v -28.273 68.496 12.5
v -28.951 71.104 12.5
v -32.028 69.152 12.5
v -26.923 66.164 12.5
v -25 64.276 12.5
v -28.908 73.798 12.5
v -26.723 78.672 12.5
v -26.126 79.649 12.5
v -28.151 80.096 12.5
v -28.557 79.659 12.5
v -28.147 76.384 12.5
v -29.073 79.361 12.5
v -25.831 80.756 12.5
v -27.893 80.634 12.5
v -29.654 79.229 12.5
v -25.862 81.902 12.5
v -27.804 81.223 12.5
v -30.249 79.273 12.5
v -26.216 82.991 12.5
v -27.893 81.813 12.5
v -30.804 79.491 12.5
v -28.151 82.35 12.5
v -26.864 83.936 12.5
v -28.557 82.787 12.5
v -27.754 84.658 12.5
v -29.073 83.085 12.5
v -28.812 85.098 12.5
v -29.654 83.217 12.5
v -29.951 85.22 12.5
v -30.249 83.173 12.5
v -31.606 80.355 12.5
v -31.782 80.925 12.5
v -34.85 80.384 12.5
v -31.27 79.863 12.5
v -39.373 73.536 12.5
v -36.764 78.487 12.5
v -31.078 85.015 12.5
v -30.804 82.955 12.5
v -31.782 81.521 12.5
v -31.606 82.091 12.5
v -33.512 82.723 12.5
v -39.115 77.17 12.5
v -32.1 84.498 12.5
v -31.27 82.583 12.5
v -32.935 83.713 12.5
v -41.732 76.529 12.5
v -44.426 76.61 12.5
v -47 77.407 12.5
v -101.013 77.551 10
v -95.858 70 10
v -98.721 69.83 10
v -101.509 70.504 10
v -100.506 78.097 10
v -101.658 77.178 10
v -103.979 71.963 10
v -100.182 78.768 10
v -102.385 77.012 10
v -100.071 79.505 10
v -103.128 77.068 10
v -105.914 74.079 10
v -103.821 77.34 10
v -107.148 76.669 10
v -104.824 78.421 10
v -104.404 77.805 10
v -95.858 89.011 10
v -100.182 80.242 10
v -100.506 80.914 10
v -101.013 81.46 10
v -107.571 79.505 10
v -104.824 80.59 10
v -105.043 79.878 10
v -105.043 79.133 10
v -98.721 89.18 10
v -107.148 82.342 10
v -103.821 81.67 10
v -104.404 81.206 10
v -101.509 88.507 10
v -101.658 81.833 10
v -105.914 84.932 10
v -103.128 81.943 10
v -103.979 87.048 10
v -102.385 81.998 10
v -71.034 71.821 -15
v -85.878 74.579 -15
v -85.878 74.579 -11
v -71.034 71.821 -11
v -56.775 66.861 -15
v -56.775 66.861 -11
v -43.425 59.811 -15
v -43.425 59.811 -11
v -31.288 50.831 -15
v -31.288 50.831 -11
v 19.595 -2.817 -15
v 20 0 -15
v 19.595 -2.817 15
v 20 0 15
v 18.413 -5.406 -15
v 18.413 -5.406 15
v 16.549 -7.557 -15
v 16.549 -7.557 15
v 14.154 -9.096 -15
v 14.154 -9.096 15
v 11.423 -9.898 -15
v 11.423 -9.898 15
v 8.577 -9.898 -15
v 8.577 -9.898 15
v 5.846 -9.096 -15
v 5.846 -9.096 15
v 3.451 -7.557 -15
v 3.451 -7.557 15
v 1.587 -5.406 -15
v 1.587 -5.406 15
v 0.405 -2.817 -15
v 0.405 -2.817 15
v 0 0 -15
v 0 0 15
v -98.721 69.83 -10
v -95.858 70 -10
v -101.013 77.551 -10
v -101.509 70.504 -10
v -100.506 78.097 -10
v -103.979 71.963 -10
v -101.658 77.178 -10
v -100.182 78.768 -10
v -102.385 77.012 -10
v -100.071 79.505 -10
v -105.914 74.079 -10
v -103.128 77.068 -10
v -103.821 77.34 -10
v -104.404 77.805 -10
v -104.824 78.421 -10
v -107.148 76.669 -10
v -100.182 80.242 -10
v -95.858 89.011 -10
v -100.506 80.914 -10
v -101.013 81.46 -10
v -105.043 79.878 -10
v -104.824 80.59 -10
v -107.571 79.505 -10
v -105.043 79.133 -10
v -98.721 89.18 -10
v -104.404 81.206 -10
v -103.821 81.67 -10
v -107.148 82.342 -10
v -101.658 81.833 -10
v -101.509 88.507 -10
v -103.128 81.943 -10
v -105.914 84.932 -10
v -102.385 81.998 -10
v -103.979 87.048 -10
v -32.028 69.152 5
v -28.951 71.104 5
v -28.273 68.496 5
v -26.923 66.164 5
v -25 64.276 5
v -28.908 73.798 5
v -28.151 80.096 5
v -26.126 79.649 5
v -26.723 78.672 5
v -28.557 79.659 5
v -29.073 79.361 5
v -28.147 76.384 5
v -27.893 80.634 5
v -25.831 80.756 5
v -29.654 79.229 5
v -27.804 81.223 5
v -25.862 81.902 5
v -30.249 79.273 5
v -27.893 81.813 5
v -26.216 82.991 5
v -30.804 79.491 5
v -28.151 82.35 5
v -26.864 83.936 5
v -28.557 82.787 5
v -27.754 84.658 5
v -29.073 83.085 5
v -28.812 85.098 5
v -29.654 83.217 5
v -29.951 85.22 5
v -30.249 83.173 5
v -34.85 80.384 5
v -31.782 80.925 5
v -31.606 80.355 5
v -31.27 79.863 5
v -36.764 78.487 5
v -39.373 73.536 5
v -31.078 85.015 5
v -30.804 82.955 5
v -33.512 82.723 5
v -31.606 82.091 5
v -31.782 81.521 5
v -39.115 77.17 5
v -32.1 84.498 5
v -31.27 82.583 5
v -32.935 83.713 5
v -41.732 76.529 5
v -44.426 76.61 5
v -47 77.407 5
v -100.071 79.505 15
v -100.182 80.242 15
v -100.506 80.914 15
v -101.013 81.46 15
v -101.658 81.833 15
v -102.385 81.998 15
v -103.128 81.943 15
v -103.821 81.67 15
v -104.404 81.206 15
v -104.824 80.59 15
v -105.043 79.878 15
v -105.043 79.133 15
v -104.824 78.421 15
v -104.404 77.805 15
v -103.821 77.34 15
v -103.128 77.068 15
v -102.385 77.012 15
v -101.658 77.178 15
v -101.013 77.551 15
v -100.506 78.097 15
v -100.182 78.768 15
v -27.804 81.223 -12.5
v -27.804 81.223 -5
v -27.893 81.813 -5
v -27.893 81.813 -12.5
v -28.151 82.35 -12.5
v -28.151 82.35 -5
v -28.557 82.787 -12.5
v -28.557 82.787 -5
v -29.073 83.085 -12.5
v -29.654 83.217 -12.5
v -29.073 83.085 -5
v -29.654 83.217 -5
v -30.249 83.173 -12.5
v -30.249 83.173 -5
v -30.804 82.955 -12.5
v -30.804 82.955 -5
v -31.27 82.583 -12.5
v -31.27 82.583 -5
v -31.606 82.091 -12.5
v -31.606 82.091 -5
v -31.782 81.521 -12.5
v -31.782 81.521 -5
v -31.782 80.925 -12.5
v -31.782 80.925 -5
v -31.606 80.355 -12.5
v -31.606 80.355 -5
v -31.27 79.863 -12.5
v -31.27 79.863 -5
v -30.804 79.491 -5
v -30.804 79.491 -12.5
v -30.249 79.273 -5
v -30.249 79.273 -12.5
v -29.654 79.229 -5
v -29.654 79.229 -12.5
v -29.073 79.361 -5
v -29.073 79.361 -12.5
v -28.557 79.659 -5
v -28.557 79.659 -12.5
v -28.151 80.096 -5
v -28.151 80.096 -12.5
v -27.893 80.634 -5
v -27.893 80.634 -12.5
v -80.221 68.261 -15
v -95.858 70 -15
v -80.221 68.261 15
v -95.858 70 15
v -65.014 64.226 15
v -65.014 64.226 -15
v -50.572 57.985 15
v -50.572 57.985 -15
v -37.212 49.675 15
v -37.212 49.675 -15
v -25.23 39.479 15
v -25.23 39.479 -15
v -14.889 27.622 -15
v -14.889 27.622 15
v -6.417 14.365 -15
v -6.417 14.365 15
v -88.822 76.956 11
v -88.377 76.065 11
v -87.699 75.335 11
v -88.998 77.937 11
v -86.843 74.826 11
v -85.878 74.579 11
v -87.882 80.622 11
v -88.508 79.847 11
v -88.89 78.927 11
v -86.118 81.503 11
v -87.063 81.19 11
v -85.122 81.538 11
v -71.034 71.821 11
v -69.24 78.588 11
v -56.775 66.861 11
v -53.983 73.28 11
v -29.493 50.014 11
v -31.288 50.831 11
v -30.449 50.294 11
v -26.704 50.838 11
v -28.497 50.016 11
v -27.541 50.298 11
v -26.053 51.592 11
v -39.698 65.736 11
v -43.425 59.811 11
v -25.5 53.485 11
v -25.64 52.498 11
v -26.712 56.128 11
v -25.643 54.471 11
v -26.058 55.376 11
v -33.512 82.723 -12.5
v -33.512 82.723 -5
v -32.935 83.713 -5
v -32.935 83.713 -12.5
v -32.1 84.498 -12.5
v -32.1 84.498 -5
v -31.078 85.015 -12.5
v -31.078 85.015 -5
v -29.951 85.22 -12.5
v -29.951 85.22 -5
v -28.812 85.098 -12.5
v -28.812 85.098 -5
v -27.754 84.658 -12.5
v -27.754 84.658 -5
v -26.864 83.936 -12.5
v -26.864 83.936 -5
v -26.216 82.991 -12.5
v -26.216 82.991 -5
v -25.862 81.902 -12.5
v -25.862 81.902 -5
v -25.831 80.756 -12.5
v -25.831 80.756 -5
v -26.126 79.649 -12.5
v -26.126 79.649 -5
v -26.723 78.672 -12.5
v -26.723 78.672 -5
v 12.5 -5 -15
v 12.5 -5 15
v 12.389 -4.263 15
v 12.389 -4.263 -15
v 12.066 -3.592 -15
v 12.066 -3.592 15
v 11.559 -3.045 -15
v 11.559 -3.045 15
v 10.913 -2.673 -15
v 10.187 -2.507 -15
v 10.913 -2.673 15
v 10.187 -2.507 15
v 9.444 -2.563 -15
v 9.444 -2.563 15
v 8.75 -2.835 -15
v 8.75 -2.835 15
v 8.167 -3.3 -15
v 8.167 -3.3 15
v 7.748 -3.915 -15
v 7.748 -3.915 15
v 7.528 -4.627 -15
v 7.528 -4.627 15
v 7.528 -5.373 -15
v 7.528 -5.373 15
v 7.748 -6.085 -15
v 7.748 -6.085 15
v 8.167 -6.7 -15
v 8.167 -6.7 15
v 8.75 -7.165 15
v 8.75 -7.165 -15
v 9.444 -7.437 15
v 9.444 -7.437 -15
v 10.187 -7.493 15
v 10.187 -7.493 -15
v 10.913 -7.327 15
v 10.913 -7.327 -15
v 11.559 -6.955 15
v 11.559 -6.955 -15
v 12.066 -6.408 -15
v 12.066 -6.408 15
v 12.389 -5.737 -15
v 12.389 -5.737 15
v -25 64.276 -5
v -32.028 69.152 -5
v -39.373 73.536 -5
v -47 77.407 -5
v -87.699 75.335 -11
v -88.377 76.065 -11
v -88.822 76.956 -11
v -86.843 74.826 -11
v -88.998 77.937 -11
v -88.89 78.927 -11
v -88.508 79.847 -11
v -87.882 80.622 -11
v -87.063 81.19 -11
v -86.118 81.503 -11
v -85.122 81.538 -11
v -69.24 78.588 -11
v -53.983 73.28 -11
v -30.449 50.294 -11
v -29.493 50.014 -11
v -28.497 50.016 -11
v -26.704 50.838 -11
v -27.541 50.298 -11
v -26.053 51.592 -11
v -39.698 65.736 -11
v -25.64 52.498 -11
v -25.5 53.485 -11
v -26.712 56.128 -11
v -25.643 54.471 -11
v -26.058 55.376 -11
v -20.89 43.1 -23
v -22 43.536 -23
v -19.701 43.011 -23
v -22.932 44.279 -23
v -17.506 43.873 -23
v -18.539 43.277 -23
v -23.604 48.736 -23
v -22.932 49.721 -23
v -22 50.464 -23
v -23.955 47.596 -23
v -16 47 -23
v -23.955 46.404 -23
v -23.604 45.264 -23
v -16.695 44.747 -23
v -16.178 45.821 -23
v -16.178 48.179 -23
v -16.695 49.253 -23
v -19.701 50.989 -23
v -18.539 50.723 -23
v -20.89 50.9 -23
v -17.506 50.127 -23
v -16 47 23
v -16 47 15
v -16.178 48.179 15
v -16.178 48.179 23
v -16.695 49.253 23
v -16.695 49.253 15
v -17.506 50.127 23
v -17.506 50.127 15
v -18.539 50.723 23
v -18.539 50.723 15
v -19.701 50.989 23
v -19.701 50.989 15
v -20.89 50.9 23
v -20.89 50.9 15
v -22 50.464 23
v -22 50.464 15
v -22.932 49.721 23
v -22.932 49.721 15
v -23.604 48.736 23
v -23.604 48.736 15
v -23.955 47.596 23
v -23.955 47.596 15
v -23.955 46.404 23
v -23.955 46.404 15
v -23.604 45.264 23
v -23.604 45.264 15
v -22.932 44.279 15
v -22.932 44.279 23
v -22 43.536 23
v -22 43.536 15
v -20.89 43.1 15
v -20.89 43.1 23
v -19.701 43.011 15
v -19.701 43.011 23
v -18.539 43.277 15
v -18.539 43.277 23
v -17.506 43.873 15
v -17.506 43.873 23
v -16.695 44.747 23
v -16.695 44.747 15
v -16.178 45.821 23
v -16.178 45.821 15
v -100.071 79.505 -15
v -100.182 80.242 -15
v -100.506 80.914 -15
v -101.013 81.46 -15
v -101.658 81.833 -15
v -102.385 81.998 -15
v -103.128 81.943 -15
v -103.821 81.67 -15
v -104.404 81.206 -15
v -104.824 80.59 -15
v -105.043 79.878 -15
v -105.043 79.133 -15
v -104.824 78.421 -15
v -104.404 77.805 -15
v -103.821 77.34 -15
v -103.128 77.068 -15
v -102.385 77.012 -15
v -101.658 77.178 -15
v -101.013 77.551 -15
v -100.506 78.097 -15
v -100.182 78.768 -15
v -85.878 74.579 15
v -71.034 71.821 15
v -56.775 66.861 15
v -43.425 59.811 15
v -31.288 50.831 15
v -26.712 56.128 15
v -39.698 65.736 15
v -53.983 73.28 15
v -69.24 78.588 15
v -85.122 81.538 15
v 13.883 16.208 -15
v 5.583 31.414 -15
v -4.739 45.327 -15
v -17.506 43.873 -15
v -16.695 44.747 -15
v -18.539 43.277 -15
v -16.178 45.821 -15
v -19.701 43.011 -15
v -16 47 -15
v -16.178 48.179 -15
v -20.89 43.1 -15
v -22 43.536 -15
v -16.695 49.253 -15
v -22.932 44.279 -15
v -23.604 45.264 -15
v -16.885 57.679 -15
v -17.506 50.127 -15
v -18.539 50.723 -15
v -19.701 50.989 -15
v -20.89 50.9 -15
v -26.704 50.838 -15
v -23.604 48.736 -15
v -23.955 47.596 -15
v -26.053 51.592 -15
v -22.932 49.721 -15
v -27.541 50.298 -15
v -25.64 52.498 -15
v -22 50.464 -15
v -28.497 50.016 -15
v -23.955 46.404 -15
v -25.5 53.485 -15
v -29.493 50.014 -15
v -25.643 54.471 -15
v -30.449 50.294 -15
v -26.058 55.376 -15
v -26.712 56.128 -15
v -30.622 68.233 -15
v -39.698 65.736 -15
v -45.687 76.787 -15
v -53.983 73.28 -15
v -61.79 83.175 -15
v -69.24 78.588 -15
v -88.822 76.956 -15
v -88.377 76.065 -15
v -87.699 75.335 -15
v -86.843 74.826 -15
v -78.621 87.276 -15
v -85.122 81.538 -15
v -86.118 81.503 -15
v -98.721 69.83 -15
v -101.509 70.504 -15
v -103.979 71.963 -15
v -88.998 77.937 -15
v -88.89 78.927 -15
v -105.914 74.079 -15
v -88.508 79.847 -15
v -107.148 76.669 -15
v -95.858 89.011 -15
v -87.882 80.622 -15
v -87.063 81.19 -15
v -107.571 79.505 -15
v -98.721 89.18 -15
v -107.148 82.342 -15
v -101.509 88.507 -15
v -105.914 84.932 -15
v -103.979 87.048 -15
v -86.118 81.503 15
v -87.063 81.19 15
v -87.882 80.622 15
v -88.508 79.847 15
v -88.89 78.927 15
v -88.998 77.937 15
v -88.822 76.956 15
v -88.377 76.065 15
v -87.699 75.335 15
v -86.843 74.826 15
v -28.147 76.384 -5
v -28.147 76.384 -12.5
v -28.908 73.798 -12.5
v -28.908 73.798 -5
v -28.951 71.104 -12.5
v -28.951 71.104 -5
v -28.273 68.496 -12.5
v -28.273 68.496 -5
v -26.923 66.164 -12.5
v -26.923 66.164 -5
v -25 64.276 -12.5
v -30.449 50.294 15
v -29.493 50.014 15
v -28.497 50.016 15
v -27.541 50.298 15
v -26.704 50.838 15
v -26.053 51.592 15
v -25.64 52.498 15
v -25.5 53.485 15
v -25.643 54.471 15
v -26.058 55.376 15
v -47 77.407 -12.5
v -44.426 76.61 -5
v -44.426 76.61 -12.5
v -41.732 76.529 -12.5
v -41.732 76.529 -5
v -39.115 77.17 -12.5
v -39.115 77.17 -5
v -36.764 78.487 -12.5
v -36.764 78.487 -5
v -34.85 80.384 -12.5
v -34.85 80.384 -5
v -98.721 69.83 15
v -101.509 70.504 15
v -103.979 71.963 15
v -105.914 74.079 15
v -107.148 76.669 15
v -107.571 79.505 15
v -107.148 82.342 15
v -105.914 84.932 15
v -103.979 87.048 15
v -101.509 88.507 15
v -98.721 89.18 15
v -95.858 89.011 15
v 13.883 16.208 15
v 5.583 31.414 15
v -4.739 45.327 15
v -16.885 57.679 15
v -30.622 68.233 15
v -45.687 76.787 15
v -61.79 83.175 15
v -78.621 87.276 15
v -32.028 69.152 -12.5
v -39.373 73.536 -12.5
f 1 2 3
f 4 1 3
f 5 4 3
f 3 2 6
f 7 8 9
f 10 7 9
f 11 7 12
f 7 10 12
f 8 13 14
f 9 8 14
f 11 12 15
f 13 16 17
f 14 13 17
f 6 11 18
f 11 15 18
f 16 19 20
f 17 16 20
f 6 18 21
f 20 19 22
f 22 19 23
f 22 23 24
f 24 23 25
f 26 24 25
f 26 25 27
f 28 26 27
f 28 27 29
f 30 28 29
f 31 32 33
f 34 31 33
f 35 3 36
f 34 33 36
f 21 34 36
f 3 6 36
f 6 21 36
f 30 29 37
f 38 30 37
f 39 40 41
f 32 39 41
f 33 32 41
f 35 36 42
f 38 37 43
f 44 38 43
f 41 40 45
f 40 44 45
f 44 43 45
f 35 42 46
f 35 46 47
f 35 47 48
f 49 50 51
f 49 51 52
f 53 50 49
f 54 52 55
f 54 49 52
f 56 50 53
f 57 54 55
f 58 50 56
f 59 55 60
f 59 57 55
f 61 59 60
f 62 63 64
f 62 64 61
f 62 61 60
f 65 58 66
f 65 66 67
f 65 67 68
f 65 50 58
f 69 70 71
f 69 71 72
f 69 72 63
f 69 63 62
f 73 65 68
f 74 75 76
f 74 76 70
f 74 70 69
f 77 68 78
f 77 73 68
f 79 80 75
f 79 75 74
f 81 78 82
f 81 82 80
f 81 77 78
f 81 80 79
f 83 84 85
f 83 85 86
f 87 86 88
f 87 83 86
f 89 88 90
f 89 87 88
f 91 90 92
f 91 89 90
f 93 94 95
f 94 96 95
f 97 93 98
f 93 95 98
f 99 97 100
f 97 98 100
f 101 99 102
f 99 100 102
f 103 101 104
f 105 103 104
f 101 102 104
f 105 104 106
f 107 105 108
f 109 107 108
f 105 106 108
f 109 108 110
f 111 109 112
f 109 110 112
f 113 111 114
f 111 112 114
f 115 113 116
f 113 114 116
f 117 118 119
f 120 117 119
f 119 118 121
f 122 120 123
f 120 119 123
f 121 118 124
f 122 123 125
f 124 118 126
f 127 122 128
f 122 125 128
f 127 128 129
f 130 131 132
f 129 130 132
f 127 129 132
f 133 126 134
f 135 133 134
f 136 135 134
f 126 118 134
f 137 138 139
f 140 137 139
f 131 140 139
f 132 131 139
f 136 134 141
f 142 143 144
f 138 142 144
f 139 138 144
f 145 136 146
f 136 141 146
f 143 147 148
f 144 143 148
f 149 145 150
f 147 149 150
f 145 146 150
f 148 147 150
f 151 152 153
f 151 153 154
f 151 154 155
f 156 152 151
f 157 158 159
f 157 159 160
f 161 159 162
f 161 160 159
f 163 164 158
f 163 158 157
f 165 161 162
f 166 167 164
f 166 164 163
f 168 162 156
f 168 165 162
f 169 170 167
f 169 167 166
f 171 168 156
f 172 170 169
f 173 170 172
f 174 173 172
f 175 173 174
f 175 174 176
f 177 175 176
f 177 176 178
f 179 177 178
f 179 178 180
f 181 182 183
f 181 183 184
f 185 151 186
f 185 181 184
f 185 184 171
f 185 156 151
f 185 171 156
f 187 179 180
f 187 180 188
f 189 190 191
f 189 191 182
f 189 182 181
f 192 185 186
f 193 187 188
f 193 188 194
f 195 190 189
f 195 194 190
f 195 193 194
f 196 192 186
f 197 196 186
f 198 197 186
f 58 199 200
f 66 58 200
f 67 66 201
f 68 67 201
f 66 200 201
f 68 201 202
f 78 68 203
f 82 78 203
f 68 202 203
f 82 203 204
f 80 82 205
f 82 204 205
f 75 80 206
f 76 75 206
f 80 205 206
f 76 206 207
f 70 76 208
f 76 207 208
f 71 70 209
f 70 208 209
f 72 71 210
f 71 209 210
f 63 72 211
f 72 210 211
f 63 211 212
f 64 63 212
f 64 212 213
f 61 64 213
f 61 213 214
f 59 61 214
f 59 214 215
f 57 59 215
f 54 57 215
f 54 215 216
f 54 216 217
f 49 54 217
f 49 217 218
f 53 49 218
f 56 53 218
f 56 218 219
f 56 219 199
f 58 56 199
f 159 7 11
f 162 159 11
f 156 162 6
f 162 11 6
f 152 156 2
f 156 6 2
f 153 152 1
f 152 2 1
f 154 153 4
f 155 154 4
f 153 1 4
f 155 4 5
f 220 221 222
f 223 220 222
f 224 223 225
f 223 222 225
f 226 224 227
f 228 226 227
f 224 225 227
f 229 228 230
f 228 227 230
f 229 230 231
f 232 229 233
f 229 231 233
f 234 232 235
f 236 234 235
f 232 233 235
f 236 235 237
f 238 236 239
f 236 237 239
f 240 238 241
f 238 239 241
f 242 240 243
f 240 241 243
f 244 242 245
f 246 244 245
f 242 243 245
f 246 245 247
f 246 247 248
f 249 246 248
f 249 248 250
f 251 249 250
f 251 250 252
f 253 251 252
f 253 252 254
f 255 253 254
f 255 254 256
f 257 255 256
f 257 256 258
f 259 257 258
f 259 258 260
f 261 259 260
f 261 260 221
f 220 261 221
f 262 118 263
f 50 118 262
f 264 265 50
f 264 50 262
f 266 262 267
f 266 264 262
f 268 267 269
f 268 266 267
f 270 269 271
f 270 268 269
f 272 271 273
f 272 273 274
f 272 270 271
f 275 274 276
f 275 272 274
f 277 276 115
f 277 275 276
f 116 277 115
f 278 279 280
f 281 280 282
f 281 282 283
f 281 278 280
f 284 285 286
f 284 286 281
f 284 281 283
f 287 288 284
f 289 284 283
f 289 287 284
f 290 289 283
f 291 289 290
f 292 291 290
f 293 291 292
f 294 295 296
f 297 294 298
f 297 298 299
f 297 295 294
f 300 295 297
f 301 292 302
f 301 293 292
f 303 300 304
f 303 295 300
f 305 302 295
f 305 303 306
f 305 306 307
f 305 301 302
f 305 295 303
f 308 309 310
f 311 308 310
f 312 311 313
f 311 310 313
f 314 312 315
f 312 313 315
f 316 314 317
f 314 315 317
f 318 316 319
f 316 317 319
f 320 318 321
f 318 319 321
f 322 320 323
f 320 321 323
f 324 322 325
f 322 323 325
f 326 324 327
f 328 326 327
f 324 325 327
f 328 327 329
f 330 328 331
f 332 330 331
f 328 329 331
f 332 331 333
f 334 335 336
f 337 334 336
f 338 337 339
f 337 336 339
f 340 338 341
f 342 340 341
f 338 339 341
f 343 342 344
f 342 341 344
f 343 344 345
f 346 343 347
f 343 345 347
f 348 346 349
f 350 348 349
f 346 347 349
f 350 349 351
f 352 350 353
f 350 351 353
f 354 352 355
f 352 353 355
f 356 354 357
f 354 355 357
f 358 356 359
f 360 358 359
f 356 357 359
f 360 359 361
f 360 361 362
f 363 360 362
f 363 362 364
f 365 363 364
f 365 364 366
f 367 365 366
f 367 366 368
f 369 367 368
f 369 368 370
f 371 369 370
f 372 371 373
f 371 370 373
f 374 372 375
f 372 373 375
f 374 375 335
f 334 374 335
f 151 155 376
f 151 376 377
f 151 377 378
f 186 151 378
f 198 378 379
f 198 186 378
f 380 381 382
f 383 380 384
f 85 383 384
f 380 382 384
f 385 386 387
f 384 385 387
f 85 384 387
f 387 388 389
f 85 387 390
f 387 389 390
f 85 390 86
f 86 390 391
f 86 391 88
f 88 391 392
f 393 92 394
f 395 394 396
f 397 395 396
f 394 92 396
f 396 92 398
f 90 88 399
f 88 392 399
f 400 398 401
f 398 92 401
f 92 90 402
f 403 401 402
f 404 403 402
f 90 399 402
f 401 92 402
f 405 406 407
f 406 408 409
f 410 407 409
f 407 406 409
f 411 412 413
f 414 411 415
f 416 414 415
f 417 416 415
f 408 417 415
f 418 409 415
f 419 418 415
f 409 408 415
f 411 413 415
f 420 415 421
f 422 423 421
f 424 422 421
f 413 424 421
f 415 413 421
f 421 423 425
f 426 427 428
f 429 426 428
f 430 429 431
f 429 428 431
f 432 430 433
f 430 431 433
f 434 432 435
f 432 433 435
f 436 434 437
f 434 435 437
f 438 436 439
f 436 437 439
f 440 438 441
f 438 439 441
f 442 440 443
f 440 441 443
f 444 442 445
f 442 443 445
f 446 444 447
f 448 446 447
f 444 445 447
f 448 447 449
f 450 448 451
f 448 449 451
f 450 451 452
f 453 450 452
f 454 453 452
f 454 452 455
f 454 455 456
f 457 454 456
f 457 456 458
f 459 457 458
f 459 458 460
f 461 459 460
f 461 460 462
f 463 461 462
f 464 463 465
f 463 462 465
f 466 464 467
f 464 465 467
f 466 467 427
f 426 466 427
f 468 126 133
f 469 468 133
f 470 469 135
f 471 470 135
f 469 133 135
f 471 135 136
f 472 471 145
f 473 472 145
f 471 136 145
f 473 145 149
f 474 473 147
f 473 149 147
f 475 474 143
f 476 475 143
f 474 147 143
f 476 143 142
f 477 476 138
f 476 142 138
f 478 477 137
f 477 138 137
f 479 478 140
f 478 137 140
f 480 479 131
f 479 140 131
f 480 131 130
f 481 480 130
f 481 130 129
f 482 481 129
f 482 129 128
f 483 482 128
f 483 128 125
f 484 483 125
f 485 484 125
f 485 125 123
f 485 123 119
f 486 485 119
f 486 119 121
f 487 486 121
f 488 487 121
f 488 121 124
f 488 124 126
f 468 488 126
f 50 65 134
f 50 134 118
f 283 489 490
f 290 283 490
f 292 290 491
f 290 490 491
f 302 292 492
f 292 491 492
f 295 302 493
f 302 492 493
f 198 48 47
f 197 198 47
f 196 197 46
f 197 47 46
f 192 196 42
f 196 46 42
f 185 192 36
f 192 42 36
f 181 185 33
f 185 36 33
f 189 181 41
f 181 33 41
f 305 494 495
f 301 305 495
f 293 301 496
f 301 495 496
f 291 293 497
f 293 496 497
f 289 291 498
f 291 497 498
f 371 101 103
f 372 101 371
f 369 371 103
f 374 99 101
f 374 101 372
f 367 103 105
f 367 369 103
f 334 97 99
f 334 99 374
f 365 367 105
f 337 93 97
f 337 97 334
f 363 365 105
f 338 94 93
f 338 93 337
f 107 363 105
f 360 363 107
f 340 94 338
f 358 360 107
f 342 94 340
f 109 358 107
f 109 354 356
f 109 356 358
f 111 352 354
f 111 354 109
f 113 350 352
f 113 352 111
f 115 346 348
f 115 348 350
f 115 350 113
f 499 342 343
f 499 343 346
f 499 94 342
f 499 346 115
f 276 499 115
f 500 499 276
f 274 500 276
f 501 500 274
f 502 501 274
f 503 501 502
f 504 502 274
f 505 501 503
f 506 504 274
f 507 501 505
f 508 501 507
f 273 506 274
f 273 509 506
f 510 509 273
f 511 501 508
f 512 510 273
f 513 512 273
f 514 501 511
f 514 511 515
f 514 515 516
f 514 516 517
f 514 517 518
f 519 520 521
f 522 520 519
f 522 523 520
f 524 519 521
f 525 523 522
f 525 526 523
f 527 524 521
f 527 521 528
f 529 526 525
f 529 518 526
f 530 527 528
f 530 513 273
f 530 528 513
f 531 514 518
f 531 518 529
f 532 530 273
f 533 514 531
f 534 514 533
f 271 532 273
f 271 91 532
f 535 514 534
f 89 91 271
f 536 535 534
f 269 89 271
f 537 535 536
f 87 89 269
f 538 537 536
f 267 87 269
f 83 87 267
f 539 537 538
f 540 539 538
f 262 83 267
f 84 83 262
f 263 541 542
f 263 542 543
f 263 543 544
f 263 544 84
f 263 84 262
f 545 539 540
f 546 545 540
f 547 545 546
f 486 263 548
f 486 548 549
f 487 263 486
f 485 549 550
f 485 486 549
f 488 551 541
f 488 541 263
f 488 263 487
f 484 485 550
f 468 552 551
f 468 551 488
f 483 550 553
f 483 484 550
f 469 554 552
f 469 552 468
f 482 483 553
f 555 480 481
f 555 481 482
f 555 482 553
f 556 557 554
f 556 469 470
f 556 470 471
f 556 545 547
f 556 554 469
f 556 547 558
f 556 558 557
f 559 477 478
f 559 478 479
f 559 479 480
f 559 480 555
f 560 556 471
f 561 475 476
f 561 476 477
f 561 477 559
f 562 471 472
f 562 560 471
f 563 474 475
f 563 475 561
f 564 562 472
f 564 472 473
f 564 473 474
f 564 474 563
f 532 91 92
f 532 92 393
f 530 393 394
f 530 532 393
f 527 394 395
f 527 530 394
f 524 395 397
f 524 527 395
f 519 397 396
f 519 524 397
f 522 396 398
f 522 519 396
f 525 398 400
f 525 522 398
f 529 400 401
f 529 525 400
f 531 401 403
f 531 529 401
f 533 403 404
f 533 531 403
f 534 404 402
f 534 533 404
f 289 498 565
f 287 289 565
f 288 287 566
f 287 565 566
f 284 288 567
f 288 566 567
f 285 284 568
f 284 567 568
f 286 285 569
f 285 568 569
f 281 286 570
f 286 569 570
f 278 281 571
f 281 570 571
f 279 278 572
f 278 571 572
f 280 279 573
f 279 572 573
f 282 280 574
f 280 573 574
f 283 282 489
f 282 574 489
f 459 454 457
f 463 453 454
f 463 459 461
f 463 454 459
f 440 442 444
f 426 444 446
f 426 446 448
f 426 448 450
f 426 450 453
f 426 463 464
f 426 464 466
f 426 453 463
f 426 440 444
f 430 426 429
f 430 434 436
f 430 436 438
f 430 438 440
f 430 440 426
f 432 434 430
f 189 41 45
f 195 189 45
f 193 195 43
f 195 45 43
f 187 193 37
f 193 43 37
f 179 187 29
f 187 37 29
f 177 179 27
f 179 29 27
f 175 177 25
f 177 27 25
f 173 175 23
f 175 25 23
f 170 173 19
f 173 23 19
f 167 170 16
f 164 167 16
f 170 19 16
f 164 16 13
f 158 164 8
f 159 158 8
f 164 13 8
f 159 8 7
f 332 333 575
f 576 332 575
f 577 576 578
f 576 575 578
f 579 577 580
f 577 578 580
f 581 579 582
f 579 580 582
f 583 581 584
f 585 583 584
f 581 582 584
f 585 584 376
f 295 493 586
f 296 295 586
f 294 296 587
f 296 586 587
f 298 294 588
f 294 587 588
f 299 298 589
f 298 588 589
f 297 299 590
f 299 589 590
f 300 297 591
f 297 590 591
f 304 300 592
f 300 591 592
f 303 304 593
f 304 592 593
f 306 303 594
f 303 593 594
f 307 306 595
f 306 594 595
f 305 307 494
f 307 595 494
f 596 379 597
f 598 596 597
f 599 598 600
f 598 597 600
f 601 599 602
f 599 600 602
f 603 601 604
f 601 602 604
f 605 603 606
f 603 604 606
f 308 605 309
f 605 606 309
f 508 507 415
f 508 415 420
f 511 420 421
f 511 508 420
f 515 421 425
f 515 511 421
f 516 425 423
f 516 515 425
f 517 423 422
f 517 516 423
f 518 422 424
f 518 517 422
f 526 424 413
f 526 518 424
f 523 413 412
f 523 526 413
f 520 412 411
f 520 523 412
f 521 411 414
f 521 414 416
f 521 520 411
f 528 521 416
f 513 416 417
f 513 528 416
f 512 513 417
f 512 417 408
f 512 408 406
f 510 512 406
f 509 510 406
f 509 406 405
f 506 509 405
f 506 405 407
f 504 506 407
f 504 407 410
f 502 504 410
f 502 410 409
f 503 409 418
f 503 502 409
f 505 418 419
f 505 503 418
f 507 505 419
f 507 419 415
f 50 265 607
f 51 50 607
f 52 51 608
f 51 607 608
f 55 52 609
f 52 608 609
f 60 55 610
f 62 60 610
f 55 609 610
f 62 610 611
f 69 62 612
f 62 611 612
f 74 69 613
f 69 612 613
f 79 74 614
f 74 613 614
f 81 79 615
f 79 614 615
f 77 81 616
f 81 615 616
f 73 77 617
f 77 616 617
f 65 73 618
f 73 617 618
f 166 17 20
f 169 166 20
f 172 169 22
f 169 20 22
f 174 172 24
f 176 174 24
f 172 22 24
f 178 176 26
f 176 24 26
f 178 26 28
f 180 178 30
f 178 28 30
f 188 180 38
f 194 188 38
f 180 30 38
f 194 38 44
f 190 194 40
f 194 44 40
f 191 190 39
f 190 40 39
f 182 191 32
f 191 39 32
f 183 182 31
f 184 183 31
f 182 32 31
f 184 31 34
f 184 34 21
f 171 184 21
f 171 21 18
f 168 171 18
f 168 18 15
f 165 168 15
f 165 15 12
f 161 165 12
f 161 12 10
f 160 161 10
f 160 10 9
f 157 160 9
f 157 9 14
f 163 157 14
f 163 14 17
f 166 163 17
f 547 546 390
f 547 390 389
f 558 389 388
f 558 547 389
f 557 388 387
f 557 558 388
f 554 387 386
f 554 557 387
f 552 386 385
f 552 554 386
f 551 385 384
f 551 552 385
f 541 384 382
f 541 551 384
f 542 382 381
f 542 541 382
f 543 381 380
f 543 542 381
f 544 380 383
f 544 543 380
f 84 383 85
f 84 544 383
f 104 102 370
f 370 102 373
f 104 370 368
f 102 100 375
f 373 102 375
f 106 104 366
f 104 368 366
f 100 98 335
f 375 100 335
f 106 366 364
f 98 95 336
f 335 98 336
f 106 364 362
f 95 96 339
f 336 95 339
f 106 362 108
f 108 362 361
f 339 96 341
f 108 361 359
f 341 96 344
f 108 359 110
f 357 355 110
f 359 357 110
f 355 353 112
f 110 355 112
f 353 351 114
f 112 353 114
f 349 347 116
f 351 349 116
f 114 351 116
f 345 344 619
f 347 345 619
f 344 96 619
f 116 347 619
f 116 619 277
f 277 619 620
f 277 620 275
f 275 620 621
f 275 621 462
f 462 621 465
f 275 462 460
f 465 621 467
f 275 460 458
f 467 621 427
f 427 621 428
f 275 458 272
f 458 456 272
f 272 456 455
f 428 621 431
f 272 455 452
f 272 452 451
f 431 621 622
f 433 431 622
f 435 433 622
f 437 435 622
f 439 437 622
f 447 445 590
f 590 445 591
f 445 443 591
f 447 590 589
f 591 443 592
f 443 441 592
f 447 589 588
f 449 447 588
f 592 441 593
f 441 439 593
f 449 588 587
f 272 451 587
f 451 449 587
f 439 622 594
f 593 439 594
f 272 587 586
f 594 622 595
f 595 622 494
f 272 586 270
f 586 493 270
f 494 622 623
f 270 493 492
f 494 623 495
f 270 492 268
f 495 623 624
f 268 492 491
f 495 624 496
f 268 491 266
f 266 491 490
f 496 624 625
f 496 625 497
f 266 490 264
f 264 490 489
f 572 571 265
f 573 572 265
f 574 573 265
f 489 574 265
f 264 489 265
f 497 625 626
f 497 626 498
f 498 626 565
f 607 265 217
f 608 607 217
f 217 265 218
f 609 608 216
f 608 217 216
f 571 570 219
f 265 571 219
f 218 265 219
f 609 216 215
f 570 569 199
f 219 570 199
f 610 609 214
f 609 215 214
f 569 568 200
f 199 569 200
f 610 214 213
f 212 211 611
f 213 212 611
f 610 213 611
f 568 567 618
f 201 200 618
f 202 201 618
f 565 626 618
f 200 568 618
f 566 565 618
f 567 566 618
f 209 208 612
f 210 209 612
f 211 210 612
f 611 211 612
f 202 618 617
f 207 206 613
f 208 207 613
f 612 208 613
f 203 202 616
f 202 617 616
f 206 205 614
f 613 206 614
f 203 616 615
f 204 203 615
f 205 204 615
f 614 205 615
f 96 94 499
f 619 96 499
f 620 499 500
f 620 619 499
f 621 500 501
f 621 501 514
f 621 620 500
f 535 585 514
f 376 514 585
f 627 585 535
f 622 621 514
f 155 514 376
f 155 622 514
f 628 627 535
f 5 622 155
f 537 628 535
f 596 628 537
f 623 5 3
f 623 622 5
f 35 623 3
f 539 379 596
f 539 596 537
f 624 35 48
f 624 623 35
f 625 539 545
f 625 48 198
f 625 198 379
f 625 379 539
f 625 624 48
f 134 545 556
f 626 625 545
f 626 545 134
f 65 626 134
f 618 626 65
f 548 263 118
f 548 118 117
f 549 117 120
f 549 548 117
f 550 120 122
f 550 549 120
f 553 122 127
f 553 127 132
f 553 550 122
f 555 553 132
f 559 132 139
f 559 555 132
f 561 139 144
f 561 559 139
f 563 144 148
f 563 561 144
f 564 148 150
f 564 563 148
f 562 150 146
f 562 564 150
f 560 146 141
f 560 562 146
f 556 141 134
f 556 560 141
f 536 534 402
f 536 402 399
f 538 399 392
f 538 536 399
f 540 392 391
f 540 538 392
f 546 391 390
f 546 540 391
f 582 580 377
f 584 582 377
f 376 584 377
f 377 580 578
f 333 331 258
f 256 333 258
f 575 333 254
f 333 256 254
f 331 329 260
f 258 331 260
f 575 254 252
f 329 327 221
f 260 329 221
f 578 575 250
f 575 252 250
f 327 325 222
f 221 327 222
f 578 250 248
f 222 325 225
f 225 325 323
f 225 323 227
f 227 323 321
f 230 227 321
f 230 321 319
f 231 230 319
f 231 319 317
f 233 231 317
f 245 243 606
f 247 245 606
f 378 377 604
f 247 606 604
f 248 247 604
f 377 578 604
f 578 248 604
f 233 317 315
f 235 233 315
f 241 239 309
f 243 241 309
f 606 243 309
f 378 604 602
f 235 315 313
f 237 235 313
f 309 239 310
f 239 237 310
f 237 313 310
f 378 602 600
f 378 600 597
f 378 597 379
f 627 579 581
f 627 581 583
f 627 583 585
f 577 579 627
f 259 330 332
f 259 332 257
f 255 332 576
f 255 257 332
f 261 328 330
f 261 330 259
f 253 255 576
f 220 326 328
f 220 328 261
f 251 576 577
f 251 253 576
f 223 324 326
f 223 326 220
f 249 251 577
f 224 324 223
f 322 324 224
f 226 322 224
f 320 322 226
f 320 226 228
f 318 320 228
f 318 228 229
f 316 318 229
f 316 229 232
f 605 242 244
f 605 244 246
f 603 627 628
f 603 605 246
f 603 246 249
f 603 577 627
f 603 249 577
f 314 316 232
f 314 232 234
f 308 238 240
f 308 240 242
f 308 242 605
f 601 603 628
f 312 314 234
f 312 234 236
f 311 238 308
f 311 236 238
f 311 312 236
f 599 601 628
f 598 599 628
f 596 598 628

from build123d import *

# Parameters (mm, degrees)
Y_KSEKLIK_EKSTR_ZYON1_DEPTH = 15
Y_KSEKLIK_EKSTR_ZYON2_DEPTH = 5
IZIM4_R                     = 2.5
KES_EKSTR_ZYON1_DEPTH       = 31
Y_KSEKLIK_EKSTR_ZYON3_DEPTH = 12.5
KES_EKSTR_ZYON2_DEPTH       = 5
IZIM7_R                     = 2
KES_EKSTR_ZYON3_DEPTH       = 28.5
IZIM8_R                     = 4
Y_KSEKLIK_EKSTR_ZYON5_DEPTH = 8
KES_EKSTR_ZYON4_DEPTH       = 4
Y_KSEKLIK_EKSTR_ZYON6_DEPTH = 15
IZIM11_R                    = 2.5
KES_EKSTR_ZYON5_DEPTH       = 30


with BuildPart() as part:
    # Çizim1 → Yükseklik-Ekstrüzyon1 (new body, symmetric)
    with BuildSketch(Plane.XY):
        with BuildLine():
            Line((-95.857885087, 89.010731317), (-95.857885087, 70))
            ThreePointArc((-95.857885087, 70), (-37.212348736, 49.675285967), (0, 0))
            Line((0, 0), (20, 0))
            ThreePointArc((20, 0), (-23.570681084, 63.194323514), (-95.857885087, 89.010731317))
        make_face()
    extrude(amount=Y_KSEKLIK_EKSTR_ZYON1_DEPTH, both=True)

    # Çizim3 → Yükseklik-Ekstrüzyon2 (add)
    with BuildSketch(Plane.XY.offset(15)):
        with BuildLine():
            Line((-95.857885087, 89.010731317), (-95.857885087, 70))
            ThreePointArc((-95.857885087, 70), (-107.571379634, 79.505365659), (-95.857885087, 89.010731317))
        make_face()
    y_kseklik_ekstr_zyon2 = extrude(amount=-Y_KSEKLIK_EKSTR_ZYON2_DEPTH)

    # Aynalama1: Yükseklik-Ekstrüzyon2 across plane
    add(y_kseklik_ekstr_zyon2.mirror(Plane.XY))

    # Çizim4 → Kes-Ekstrüzyon1 (cut, through all)
    with BuildSketch(Plane.XY.offset(15)):
        with Locations((-102.571379634, 79.505365659)):
            Circle(IZIM4_R)
    extrude(amount=-KES_EKSTR_ZYON1_DEPTH, mode=Mode.SUBTRACT)

    # Çizim5 → Yükseklik-Ekstrüzyon3 (add, symmetric)
    with BuildSketch(Plane.XY):
        with BuildLine():
            ThreePointArc((-25, 64.276224342), (-35.66270362, 71.406588574), (-47, 77.406676353))
            ThreePointArc((-47, 77.406676353), (-39.114950806, 77.17019229), (-33.511903594, 82.723190348))
            ThreePointArc((-33.511903594, 82.723190348), (-27.753871547, 84.657793137), (-26.723332165, 78.671508013))
            ThreePointArc((-26.723332165, 78.671508013), (-28.951102684, 71.104014108), (-25, 64.276224342))
        make_face()
    extrude(amount=Y_KSEKLIK_EKSTR_ZYON3_DEPTH, both=True)

    # Çizim6 → Kes-Ekstrüzyon2 (cut, symmetric)
    with BuildSketch(Plane.XY):
        with BuildLine():
            ThreePointArc((-25, 64.276224342), (-35.66270362, 71.406588574), (-47, 77.406676353))
            ThreePointArc((-47, 77.406676353), (-39.114950806, 77.17019229), (-33.511903594, 82.723190348))
            ThreePointArc((-33.511903594, 82.723190348), (-27.753871547, 84.657793137), (-26.723332165, 78.671508013))
            ThreePointArc((-26.723332165, 78.671508013), (-28.951102684, 71.104014108), (-25, 64.276224342))
        make_face()
    extrude(amount=KES_EKSTR_ZYON2_DEPTH, both=True, mode=Mode.SUBTRACT)

    # Çizim7 → Kes-Ekstrüzyon3 (cut, through all)
    with BuildSketch(Plane.XY.offset(12.5)):
        with Locations((-29.803865031, 81.223040349)):
            Circle(IZIM7_R)
    extrude(amount=-KES_EKSTR_ZYON3_DEPTH, mode=Mode.SUBTRACT)

    # Çizim8 → Yükseklik-Ekstrüzyon5 (add)
    with BuildSketch(Plane.XY.offset(15)):
        with Locations((-20, 47)):
            Circle(IZIM8_R)
    y_kseklik_ekstr_zyon5 = extrude(amount=Y_KSEKLIK_EKSTR_ZYON5_DEPTH)

    # Aynalama2: Yükseklik-Ekstrüzyon5 across plane
    add(y_kseklik_ekstr_zyon5.mirror(Plane.XY))

    # Çizim9 → Kes-Ekstrüzyon4 (cut)
    with BuildSketch(Plane.XY.offset(15)):
        with BuildLine():
            ThreePointArc((-26.711830739, 56.128041308), (-53.982517061, 73.280029195), (-85.122353286, 81.537850995))
            ThreePointArc((-85.122353286, 81.537850995), (-88.97956649, 78.435931218), (-85.877646714, 74.578718014))
            ThreePointArc((-85.877646714, 74.578718014), (-56.774887256, 66.861098701), (-31.288169261, 50.831143563))
            ThreePointArc((-31.288169261, 50.831143563), (-26.351551127, 51.191423174), (-26.711830739, 56.128041308))
        make_face()
    kes_ekstr_zyon4 = extrude(amount=-KES_EKSTR_ZYON4_DEPTH, mode=Mode.SUBTRACT)

    # Aynalama3: Kes-Ekstrüzyon4 across plane
    add(kes_ekstr_zyon4.mirror(Plane.XY), mode=Mode.SUBTRACT)

    # Çizim10 → Yükseklik-Ekstrüzyon6 (add, symmetric)
    with BuildSketch(Plane.XY):
        with BuildLine():
            Line((0, 0), (20, 0))
            ThreePointArc((20, 0), (10, -10), (0, 0))
        make_face()
    extrude(amount=Y_KSEKLIK_EKSTR_ZYON6_DEPTH, both=True)

    # Çizim11 → Kes-Ekstrüzyon5 (cut)
    with BuildSketch(Plane.XY.offset(15)):
        with Locations((10, -5)):
            Circle(IZIM11_R)
    extrude(amount=-KES_EKSTR_ZYON5_DEPTH, mode=Mode.SUBTRACT)


solid = part.part
